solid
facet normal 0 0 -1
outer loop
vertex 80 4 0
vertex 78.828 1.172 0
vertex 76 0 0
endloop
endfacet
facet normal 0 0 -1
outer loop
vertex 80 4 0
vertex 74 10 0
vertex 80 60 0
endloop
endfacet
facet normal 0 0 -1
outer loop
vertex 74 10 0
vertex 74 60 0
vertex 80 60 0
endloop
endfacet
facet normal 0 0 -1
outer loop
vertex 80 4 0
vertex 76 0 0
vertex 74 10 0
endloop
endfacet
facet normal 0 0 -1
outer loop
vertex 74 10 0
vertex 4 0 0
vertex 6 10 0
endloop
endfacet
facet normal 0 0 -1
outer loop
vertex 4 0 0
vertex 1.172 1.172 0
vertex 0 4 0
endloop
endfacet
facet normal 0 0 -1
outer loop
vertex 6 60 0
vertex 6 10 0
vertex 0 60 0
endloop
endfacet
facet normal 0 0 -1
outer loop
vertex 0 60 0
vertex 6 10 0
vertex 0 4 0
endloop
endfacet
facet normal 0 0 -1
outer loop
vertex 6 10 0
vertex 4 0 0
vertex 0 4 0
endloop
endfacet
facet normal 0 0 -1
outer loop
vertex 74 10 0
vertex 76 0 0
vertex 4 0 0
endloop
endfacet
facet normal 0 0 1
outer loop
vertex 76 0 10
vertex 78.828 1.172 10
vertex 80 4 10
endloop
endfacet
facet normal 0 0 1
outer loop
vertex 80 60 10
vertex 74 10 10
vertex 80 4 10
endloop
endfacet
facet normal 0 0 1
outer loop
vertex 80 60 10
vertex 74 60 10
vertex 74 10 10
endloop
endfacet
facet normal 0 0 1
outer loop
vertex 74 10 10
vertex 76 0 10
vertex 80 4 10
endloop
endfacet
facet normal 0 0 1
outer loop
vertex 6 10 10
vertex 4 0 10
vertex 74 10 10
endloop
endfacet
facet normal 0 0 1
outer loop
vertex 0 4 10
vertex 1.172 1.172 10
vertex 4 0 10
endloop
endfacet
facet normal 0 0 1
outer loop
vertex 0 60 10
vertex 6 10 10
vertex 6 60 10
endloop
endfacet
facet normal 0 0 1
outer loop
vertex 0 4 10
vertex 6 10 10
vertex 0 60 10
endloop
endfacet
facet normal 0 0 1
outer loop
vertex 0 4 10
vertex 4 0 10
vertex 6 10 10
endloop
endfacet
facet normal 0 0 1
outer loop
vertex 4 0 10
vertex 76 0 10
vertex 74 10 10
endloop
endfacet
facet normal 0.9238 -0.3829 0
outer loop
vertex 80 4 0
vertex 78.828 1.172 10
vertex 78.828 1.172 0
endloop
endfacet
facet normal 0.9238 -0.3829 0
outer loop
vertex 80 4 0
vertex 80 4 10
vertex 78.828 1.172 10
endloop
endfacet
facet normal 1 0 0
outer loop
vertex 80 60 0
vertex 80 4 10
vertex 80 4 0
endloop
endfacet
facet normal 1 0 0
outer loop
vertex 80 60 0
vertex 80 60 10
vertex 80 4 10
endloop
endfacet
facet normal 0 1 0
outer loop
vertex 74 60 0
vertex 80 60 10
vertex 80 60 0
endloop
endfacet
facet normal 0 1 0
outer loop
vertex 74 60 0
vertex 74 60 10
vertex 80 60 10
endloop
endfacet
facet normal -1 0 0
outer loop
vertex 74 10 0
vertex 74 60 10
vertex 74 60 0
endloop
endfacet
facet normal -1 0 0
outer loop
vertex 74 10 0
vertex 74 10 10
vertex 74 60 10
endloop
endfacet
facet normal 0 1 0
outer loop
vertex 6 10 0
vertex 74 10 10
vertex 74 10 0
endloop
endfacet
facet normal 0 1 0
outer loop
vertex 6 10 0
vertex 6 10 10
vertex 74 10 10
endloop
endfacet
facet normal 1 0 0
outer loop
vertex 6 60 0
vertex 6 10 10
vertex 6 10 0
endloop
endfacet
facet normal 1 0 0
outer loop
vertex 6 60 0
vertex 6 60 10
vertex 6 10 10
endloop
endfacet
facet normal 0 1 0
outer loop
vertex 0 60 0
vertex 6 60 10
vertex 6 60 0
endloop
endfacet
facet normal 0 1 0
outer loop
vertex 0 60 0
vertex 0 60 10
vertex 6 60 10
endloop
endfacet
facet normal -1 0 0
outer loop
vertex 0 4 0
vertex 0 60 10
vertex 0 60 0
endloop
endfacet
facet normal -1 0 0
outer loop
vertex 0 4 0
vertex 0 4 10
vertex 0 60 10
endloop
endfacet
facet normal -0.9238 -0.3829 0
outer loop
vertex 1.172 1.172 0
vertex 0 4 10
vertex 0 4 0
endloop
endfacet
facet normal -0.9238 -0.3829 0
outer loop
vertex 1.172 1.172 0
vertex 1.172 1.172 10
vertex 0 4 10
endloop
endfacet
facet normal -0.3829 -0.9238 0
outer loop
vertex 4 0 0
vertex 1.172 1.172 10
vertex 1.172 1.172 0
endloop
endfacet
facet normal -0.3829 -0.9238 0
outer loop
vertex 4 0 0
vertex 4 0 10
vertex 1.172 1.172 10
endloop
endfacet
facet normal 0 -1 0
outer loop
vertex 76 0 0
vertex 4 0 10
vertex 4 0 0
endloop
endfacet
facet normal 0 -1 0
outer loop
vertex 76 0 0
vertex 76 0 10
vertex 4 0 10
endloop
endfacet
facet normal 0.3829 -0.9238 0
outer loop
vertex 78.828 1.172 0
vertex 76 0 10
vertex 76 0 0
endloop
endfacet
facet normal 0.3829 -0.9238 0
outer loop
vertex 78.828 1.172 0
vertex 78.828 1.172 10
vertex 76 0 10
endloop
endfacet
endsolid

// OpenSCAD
$fn = 32;

// ----------------------------------------------------------------------
// Heat sink frame: 80 x 60 mm frame, 6 mm walls
// ----------------------------------------------------------------------

// --- parameters (mm) ---
profile_height = 10;      // extrusion height
profile_points = 12;      // points of the closed outline

profile = [[0, 4], [1.172, 1.172], [4, 0], [76, 0], [78.828, 1.172], [80, 4], [80, 60], [74, 60], [74, 10], [6, 10], [6, 60], [0, 60]];  // single closed polygon, 12 points, counter clockwise

// --- the one profile operation ---
linear_extrude(height = profile_height) polygon(points = profile);
